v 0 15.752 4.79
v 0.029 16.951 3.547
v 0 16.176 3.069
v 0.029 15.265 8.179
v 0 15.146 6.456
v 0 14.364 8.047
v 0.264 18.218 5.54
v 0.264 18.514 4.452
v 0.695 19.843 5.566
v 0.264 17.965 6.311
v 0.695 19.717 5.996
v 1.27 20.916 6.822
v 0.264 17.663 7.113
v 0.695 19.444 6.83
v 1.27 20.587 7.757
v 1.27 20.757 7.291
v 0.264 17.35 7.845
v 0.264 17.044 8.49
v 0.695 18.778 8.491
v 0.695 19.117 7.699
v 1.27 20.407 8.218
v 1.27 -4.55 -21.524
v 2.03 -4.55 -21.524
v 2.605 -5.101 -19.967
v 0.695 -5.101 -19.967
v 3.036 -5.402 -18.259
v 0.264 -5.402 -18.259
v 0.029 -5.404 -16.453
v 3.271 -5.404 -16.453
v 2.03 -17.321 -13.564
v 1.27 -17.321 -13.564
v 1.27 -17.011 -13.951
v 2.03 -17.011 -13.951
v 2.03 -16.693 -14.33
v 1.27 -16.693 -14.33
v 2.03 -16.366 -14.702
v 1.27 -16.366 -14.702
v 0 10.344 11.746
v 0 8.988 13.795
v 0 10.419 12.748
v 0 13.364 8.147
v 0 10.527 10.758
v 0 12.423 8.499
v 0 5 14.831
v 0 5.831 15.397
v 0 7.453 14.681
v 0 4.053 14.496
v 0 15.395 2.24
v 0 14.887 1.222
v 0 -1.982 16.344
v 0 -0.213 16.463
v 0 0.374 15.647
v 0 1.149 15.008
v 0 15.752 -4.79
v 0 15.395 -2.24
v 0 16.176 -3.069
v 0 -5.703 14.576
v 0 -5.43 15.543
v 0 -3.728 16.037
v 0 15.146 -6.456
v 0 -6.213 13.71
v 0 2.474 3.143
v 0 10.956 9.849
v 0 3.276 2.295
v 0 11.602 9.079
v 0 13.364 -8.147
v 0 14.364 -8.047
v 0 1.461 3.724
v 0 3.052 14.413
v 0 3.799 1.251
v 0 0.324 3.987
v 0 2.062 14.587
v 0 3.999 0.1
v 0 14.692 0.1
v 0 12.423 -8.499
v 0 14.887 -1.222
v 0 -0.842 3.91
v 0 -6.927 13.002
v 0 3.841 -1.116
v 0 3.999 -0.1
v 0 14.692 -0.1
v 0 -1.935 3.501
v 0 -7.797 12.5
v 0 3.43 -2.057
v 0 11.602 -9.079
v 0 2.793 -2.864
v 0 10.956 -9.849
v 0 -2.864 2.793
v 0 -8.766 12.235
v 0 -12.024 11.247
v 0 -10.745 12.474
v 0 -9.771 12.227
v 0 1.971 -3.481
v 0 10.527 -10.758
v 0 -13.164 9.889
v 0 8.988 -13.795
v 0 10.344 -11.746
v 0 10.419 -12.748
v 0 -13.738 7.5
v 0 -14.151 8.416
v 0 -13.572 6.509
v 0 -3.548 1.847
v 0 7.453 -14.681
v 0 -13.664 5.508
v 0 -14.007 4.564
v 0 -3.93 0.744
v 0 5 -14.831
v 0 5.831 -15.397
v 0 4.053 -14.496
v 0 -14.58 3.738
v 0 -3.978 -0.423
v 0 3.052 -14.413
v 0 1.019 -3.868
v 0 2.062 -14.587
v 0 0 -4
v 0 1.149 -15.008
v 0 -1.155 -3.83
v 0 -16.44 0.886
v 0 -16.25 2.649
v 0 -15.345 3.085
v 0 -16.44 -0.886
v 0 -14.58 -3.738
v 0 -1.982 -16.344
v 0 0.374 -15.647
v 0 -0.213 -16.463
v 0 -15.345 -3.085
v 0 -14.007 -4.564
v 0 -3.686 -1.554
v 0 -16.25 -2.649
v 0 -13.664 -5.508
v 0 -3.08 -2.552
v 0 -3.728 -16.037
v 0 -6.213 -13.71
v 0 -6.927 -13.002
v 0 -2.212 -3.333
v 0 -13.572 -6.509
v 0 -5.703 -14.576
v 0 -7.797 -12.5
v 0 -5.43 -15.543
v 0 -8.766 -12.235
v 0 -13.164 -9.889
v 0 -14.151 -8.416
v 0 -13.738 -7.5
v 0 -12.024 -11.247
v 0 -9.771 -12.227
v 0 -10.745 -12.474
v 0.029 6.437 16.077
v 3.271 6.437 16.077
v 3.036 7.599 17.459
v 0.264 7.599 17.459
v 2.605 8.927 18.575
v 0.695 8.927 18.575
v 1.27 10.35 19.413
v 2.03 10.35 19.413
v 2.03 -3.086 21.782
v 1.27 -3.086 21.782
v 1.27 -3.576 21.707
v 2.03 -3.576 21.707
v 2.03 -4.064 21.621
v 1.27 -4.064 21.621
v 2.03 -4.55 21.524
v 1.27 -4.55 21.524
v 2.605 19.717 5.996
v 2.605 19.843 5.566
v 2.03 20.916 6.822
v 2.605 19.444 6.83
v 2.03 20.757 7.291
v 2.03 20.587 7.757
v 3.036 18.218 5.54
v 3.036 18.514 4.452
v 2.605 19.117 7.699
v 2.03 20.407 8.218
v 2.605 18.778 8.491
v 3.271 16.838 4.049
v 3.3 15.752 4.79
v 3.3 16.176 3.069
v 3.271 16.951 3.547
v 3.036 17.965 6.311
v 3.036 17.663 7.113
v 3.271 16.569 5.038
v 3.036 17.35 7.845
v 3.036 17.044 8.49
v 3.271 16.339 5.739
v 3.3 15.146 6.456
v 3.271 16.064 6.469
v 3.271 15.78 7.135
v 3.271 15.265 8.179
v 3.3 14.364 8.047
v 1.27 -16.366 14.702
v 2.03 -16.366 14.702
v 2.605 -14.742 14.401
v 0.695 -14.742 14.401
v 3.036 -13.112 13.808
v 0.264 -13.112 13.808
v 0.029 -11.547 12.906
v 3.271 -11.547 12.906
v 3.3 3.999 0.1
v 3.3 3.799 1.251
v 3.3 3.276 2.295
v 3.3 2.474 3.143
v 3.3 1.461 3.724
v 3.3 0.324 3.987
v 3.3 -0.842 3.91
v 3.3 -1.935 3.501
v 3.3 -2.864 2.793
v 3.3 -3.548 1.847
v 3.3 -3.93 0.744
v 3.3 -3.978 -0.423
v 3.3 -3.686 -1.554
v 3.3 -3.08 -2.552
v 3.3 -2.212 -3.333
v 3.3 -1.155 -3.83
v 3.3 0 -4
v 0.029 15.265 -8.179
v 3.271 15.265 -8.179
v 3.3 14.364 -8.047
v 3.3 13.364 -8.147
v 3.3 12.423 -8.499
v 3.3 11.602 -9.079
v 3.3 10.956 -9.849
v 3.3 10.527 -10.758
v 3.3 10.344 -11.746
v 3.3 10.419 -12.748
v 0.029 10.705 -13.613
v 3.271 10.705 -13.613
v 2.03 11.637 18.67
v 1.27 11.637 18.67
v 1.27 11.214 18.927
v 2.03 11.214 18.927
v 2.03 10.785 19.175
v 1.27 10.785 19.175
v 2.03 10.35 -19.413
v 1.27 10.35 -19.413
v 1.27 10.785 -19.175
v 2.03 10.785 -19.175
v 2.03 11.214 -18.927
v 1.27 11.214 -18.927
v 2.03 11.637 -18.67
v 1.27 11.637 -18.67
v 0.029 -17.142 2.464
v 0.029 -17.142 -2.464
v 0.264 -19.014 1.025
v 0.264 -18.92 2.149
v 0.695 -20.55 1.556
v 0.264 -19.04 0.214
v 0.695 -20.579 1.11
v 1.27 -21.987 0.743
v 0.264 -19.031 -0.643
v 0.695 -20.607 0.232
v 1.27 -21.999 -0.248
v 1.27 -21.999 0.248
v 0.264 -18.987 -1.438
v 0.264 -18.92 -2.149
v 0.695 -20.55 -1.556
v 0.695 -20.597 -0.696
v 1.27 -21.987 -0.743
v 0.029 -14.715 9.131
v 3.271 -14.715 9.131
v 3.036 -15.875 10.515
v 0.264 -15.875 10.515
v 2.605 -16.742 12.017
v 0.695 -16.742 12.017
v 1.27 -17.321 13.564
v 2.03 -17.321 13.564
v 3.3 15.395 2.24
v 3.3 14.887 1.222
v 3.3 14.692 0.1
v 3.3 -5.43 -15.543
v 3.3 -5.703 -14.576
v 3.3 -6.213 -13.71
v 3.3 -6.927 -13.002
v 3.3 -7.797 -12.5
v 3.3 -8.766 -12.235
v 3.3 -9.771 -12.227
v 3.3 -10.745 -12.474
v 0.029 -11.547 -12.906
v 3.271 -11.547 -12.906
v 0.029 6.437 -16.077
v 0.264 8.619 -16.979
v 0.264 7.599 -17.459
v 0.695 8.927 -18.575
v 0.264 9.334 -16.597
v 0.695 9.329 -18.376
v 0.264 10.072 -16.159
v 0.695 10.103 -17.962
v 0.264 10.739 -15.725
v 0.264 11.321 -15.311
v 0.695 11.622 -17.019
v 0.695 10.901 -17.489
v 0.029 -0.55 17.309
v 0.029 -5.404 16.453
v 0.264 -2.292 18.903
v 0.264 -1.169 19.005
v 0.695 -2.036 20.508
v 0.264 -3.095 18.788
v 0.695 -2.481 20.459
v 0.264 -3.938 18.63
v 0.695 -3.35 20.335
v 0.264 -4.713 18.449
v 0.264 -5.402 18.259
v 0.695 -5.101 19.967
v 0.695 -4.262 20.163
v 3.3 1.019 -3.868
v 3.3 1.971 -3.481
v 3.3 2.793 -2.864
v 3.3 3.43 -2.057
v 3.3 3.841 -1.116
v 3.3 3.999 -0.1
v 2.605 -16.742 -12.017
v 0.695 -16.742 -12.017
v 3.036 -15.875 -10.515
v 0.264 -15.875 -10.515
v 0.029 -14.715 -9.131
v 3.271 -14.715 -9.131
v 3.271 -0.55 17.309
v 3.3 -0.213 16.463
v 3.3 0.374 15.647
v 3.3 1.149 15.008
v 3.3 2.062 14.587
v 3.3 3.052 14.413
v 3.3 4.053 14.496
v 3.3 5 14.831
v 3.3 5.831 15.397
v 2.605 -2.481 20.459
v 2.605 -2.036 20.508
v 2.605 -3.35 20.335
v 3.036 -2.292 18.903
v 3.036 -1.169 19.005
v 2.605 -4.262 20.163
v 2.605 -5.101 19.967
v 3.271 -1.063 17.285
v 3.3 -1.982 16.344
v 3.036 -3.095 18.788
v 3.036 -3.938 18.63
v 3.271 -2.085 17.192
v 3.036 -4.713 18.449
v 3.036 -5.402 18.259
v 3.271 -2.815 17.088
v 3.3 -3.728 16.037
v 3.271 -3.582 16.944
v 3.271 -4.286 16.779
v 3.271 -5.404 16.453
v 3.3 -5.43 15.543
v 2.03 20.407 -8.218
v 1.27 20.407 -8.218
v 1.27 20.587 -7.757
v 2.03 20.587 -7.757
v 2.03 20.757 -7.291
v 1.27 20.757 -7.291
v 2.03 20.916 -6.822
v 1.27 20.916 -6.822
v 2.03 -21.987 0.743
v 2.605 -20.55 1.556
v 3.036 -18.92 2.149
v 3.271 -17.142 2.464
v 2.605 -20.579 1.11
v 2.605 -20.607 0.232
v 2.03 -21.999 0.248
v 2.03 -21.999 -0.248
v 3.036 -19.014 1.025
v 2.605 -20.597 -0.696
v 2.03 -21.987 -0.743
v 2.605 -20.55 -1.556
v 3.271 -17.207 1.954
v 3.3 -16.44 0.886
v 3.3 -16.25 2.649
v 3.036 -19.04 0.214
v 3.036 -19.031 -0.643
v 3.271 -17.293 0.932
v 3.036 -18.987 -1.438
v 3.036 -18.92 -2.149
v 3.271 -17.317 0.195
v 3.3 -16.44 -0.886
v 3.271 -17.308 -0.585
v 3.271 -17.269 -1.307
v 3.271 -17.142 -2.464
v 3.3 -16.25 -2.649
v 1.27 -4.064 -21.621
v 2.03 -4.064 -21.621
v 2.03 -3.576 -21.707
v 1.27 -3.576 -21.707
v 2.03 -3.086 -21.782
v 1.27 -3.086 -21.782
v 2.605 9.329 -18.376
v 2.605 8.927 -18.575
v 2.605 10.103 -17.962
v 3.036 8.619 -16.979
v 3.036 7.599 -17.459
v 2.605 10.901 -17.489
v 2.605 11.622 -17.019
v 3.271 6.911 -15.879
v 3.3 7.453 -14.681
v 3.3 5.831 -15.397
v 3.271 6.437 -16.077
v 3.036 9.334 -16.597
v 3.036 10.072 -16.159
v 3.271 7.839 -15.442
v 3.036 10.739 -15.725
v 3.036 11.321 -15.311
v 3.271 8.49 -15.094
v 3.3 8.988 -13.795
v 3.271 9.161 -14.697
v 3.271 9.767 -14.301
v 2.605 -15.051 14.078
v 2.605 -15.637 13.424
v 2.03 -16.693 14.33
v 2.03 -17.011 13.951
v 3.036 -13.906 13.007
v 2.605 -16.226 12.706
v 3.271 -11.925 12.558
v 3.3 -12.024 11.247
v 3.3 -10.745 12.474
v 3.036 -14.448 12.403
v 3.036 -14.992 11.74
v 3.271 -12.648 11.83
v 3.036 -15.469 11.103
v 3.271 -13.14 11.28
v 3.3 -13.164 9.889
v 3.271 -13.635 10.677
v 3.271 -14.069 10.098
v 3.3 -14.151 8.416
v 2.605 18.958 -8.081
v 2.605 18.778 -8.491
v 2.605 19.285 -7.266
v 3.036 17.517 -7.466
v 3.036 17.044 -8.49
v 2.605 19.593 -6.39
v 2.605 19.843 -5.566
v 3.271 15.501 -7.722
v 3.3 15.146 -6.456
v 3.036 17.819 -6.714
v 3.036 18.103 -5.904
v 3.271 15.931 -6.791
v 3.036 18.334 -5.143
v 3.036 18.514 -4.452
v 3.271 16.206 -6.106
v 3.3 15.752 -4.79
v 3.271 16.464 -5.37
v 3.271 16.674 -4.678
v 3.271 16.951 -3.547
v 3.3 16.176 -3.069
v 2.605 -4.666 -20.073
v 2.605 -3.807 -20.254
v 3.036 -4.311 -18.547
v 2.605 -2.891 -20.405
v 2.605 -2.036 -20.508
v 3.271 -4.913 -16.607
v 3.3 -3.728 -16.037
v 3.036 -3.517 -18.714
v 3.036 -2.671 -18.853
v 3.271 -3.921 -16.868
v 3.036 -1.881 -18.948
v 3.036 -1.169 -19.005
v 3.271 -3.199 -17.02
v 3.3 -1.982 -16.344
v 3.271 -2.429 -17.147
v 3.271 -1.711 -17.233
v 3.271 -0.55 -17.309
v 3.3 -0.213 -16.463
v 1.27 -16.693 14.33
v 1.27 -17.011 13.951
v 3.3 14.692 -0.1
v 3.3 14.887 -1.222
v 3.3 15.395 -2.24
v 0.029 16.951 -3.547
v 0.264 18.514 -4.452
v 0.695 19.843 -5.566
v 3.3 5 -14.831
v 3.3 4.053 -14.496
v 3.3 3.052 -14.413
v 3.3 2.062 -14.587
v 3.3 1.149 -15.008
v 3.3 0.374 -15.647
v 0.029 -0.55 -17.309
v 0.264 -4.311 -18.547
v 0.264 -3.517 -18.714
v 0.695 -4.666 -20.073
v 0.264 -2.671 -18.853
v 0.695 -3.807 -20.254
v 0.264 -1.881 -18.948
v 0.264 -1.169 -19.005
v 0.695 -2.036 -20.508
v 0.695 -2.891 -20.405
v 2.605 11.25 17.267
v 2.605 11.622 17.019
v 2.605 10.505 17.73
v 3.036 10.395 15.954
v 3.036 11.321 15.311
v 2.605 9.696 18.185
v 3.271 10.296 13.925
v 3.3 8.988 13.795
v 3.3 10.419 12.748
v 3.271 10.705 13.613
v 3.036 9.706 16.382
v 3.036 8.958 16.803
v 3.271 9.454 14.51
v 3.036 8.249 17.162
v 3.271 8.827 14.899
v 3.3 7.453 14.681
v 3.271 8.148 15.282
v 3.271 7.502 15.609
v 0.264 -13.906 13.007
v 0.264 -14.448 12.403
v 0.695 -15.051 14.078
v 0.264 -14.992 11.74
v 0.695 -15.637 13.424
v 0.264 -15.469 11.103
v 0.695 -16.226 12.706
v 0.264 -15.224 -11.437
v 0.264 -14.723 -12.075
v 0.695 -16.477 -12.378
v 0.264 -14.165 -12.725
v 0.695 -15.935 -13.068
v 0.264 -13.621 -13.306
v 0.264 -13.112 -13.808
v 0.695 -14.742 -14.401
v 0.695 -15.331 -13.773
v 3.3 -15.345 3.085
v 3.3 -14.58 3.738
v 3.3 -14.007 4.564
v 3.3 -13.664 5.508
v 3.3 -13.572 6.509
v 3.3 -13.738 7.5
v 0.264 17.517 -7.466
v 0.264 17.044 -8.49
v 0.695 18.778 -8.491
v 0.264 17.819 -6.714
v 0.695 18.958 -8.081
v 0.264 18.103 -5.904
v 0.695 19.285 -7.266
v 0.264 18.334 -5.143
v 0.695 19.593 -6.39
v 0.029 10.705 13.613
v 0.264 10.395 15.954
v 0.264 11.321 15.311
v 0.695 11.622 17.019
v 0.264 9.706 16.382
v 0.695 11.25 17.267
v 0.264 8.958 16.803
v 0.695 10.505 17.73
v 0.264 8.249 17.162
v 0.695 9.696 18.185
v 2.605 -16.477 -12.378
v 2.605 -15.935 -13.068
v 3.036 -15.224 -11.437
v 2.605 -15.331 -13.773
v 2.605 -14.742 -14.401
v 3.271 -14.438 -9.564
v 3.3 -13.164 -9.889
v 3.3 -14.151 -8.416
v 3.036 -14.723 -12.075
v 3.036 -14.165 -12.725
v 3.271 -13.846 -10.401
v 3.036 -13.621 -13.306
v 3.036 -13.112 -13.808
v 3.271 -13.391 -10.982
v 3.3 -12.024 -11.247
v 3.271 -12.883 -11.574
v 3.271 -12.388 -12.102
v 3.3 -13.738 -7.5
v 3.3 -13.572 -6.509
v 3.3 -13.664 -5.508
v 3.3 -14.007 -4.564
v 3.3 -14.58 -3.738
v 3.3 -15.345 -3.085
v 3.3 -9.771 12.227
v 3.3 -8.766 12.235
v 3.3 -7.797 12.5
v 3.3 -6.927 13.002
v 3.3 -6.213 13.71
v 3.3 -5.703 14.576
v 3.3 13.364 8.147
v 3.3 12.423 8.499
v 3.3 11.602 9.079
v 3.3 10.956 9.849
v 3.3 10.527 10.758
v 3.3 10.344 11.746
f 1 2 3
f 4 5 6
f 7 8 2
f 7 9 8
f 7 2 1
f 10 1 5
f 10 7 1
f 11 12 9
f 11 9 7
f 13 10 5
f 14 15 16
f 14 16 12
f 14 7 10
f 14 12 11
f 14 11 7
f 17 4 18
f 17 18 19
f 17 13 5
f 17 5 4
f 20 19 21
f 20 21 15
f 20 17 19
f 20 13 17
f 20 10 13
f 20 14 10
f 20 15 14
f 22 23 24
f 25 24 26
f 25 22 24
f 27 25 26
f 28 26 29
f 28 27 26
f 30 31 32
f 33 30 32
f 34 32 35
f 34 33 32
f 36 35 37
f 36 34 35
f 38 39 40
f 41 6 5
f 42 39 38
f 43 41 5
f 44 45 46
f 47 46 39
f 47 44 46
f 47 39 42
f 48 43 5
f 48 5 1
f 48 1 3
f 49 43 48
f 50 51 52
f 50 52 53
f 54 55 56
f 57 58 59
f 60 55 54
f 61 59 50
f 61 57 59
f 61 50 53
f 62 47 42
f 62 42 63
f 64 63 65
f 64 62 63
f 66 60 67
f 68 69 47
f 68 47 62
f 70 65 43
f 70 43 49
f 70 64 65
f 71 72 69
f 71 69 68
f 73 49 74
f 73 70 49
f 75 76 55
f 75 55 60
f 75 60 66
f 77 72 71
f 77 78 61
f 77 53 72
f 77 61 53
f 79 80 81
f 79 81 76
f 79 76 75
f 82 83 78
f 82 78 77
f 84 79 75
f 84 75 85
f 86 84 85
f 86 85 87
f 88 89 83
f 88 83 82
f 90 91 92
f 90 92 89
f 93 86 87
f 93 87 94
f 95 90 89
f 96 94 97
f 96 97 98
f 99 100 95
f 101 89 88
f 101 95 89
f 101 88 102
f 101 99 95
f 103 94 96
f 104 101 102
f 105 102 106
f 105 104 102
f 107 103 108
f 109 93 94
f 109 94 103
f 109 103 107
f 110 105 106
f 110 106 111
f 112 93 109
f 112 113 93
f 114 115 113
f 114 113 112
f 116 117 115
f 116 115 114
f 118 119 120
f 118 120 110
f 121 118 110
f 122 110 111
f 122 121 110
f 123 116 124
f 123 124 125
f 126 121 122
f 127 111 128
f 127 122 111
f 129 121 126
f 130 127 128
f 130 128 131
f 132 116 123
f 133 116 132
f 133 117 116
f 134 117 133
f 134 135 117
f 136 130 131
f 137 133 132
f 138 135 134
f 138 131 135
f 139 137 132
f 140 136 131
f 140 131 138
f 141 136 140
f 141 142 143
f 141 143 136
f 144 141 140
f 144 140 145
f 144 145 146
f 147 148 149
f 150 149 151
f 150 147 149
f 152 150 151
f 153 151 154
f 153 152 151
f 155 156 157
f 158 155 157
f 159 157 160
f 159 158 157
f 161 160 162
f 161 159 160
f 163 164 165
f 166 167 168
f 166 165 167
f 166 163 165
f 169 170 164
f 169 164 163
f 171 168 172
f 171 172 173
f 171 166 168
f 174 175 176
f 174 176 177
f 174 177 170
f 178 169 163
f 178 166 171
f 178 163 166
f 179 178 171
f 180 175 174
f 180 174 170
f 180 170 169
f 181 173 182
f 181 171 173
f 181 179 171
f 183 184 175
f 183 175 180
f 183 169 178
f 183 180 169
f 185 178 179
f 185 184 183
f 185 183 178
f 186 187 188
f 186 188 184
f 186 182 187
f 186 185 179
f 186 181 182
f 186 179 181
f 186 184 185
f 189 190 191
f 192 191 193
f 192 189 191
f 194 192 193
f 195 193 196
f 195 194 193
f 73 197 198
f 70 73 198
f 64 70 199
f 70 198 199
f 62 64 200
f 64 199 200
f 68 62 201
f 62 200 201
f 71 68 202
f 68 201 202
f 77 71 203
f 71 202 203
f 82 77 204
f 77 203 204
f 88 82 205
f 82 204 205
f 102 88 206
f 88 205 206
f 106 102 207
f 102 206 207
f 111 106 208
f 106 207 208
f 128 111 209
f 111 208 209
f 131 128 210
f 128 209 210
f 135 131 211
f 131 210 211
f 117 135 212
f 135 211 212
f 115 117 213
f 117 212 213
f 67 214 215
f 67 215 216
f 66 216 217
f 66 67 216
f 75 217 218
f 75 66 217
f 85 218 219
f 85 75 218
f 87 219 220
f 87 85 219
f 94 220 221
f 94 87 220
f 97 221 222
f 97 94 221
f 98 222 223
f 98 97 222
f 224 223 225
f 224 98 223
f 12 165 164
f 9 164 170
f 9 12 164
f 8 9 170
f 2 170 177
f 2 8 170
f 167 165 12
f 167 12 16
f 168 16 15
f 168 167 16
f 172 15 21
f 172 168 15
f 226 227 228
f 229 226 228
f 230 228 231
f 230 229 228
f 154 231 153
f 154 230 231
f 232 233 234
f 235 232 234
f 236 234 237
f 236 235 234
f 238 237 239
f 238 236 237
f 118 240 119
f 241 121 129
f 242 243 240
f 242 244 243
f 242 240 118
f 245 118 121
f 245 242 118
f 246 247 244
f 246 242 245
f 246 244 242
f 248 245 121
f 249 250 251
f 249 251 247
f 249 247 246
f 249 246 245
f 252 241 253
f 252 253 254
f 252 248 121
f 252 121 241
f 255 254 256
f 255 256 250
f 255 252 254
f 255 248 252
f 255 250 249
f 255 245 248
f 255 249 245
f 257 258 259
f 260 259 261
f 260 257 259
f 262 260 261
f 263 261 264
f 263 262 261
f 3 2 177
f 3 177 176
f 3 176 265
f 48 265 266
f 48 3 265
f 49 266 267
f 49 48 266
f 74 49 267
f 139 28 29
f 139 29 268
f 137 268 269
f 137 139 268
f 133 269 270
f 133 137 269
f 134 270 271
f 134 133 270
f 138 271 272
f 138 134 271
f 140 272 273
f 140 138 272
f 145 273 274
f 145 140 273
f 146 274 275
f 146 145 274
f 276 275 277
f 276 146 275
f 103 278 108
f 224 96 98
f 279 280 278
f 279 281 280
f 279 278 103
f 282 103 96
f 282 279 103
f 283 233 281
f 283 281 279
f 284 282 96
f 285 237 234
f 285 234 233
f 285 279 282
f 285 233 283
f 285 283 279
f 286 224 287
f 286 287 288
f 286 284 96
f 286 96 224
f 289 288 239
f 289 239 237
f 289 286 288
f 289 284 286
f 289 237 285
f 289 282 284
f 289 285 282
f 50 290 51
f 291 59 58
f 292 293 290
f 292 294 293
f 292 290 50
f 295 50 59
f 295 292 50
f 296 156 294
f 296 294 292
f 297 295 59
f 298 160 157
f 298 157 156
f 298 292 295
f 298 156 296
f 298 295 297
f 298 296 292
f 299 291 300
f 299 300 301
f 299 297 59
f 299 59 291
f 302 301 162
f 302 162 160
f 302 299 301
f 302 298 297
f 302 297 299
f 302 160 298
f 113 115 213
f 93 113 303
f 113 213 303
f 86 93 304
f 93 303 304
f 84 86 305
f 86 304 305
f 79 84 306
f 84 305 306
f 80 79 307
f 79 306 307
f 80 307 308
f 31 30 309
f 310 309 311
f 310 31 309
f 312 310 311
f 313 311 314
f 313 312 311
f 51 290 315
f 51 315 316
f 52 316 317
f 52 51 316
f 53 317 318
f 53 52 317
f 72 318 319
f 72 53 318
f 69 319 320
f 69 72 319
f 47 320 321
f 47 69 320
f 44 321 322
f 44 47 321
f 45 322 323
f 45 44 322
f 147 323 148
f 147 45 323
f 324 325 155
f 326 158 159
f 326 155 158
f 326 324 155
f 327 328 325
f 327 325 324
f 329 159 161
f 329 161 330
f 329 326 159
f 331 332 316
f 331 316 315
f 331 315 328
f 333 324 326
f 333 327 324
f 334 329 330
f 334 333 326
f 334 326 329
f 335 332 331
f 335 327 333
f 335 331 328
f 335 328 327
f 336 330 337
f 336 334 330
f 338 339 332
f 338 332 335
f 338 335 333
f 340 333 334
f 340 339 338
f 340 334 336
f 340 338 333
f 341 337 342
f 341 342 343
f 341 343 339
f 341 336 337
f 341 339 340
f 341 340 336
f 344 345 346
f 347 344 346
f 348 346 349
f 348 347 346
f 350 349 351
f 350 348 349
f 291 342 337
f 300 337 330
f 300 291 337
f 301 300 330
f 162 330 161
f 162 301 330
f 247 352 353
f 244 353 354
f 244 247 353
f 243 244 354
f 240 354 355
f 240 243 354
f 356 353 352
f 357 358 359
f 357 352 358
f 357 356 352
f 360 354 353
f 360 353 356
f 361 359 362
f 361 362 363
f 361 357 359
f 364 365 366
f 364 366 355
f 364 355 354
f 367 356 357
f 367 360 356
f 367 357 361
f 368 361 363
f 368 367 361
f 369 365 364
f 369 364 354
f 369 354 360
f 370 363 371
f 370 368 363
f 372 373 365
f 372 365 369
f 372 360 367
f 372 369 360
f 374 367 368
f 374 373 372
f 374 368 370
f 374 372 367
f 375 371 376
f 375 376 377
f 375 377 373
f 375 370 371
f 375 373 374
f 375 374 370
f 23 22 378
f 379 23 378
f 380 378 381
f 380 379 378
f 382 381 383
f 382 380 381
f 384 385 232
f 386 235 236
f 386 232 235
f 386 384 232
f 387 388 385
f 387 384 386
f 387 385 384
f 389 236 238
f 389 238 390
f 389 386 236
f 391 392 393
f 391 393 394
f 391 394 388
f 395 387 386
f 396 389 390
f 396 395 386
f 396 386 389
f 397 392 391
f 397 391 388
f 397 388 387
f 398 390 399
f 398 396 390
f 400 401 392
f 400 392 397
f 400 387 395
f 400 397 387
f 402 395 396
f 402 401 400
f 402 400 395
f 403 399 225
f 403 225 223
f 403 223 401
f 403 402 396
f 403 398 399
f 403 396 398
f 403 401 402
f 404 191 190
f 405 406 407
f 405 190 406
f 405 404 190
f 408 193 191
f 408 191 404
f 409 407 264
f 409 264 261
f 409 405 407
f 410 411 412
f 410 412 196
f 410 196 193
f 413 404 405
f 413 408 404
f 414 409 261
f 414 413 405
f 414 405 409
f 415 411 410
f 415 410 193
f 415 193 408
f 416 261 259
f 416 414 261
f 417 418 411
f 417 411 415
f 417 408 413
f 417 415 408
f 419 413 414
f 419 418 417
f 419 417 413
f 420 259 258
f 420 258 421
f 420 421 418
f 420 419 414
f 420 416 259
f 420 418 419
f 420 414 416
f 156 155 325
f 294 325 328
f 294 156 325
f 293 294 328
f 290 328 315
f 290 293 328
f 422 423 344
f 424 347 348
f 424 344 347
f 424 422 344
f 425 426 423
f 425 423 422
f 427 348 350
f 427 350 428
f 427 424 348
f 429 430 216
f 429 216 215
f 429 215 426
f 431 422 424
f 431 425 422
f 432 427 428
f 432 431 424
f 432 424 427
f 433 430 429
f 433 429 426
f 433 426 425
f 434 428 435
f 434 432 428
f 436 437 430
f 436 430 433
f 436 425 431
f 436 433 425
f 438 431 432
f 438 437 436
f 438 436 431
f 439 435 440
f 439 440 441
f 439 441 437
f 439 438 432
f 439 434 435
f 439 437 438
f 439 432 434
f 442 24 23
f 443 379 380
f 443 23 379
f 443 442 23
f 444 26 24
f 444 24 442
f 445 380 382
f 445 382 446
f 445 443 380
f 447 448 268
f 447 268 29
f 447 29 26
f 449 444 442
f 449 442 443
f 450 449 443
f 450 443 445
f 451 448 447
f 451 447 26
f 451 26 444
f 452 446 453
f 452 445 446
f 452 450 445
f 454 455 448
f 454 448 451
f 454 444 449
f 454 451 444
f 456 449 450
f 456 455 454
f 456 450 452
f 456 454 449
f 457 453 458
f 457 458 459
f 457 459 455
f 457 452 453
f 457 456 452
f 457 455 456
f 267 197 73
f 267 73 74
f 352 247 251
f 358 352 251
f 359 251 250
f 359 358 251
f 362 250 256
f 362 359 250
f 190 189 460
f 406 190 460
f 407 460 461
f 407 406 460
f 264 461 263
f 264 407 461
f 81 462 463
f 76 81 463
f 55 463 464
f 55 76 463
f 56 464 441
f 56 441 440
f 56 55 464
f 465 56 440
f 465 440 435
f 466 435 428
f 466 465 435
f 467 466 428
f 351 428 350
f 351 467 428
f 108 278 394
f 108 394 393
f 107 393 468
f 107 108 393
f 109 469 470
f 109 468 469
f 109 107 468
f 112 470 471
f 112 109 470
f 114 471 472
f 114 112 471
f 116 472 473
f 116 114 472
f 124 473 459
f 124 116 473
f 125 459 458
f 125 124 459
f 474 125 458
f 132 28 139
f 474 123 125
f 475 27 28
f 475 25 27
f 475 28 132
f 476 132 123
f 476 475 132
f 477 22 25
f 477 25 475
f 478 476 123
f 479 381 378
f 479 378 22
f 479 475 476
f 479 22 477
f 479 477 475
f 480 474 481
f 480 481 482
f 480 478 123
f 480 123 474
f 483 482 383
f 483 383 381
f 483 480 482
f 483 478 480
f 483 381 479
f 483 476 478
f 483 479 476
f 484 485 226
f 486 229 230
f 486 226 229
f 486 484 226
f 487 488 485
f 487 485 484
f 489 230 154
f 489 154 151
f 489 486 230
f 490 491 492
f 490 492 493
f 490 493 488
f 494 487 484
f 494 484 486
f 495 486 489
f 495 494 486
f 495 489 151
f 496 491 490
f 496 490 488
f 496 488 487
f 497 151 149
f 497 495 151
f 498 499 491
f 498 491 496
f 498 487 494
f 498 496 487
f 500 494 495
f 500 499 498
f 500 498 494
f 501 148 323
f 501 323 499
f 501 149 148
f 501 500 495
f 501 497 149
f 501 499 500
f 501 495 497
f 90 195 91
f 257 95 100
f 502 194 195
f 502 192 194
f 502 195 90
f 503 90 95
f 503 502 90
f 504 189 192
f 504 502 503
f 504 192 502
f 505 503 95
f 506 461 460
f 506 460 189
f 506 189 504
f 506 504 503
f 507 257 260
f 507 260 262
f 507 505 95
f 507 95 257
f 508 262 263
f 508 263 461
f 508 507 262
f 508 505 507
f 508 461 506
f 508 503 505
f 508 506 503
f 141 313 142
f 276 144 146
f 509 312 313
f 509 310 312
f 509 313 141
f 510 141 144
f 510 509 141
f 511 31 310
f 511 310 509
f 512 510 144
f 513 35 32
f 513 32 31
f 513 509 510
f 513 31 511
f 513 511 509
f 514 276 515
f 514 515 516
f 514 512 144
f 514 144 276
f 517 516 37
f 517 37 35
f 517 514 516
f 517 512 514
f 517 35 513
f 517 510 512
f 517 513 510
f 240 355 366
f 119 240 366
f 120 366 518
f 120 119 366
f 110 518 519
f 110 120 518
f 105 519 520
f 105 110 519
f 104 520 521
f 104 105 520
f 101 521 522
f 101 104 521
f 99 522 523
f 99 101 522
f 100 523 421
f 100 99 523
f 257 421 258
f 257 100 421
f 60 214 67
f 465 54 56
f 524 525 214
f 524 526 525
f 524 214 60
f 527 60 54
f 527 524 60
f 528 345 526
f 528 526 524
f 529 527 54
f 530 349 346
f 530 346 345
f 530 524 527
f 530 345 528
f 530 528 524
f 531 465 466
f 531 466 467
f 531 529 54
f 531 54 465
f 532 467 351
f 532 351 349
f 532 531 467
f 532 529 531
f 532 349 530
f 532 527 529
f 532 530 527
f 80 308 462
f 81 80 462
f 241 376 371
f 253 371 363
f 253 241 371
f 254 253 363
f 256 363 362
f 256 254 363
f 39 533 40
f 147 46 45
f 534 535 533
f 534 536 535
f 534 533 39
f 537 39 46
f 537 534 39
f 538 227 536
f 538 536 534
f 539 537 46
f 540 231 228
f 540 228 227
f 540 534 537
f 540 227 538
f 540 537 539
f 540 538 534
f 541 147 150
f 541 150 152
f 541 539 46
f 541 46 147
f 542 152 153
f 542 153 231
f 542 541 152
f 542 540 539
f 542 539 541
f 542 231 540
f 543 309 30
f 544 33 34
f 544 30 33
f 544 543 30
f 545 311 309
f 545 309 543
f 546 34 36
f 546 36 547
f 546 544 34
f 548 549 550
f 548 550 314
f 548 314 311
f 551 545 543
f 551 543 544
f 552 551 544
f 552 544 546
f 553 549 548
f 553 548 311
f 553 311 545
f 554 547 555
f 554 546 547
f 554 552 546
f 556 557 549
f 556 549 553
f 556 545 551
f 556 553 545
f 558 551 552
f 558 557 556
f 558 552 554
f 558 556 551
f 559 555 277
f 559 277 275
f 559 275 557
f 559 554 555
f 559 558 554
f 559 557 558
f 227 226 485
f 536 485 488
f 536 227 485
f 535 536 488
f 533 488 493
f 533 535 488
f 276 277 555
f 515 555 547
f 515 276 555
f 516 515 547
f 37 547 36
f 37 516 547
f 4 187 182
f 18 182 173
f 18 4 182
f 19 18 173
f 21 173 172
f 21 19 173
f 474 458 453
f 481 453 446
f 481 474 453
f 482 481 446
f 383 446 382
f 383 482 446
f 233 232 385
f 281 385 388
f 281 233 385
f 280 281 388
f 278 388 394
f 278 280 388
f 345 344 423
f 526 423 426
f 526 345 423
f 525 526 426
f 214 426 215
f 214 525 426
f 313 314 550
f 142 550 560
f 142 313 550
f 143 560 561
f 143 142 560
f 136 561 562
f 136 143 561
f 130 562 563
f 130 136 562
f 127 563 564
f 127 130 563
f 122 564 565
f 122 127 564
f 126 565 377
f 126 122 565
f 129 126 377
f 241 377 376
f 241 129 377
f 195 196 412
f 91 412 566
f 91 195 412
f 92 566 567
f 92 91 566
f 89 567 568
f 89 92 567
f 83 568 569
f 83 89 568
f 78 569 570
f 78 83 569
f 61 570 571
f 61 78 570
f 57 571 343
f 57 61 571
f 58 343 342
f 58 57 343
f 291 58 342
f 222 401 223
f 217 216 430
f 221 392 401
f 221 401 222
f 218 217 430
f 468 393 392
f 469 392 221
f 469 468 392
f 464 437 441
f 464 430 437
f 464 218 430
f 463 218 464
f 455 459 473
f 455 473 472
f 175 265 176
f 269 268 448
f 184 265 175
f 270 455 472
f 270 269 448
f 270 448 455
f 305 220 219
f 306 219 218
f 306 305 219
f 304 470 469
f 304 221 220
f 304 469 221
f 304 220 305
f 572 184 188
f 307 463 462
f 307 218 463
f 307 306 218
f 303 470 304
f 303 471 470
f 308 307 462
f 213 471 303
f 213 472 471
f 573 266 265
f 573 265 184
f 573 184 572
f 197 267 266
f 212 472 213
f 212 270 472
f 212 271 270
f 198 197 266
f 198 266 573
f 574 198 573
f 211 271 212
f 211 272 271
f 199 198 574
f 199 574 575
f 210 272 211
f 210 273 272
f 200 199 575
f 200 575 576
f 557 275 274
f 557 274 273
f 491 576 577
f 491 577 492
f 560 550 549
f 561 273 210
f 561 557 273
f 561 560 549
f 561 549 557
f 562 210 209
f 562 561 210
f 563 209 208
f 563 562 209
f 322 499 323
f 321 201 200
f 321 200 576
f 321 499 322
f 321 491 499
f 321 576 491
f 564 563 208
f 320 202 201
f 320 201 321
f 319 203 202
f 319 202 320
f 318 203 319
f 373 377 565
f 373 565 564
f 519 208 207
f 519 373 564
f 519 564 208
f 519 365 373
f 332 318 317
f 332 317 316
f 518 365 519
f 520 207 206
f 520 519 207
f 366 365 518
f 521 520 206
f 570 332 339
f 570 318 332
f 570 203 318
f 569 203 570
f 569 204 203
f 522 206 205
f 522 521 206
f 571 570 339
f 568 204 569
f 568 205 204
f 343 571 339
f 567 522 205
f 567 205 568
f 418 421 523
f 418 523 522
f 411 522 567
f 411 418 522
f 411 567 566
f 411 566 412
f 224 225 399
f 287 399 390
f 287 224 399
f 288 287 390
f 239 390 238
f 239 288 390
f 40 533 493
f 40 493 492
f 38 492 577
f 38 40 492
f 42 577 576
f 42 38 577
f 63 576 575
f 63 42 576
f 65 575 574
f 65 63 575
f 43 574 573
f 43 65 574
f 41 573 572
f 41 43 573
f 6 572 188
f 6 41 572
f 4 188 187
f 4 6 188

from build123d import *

# Parameters (mm, degrees)
CORTE_EXTRUS_O1_DEPTH = 32.287217837
PADR_OCIRCULAR2_COUNT = 9
ESBO_O6_R             = 4
CORTE_EXTRUS_O2_DEPTH = 32.134624111
ESBO_O7_W             = 0.2
ESBO_O7_H             = 30
CORTE_EXTRUS_O3_DEPTH = 10


with BuildPart() as part:
    # Esboço2 → Revolução1 (revolve)
    with BuildSketch(Plane.XY, mode=Mode.PRIVATE) as revolu_o1_sk:
        with BuildLine():
            Line((0, 0), (0, 16.464198342))
            ThreePointArc((0, 16.464198342), (0.321571182, 19.304004673), (1.27, 22))
            Line((1.27, 22), (2.03, 22))
            ThreePointArc((2.03, 22), (2.978428818, 19.304004673), (3.3, 16.464198342))
            Line((3.3, 16.464198342), (3.3, 0))
            Line((3.3, 0), (0, 0))
        make_face()
    revolve(revolu_o1_sk.sketch.rotate(Axis((0, 0, 0), (1, 0, 0)), 90), axis=Axis((0, 0, 0), (1, 0, 0)))

    # Esboço5 → Corte-extrusão1 (cut, through all)
    with BuildSketch(Plane(origin=(0, 0, 0), x_dir=(0, 0, -1), z_dir=(1, 0, 0))):
        with BuildLine():
            ThreePointArc((3.547062102, 16.950885739), (5.413227359, 19.685368366), (8.05493296, 21.680702805))
            ThreePointArc((8.05493296, 21.680702805), (0, 23.128657961), (-8.05493296, 21.680702805))
            ThreePointArc((-8.05493296, 21.680702805), (-5.413227359, 19.685368366), (-3.547062102, 16.950885739))
            ThreePointArc((-3.547062102, 16.950885739), (0, 14.691157961), (3.547062102, 16.950885739))
        make_face()
    corte_extrus_o1 = extrude(amount=CORTE_EXTRUS_O1_DEPTH, mode=Mode.SUBTRACT)

    # PadrãoCircular2: Corte-extrusão1 ×9 about axis
    padr_ocircular2_axis = Axis((0, 0, 0), (1, 0, 0))
    for i in range(1, PADR_OCIRCULAR2_COUNT):
        add(corte_extrus_o1.rotate(padr_ocircular2_axis, i * 360 / PADR_OCIRCULAR2_COUNT), mode=Mode.SUBTRACT)

    # Esboço6 → Corte-extrusão2 (cut, through all)
    with BuildSketch(Plane(origin=(3.3, 0, 0), x_dir=(0, 0, -1), z_dir=(1, 0, 0))):
        Circle(ESBO_O6_R)
    extrude(amount=-CORTE_EXTRUS_O2_DEPTH, mode=Mode.SUBTRACT)

    # Esboço7 → Corte-extrusão3 (cut)
    with BuildSketch(Plane(origin=(3.3, 0, 0), x_dir=(0, 0, -1), z_dir=(1, 0, 0))):
        with Locations((0, 15)):
            Rectangle(ESBO_O7_W, ESBO_O7_H)
    extrude(amount=-CORTE_EXTRUS_O3_DEPTH, mode=Mode.SUBTRACT)


solid = part.part
